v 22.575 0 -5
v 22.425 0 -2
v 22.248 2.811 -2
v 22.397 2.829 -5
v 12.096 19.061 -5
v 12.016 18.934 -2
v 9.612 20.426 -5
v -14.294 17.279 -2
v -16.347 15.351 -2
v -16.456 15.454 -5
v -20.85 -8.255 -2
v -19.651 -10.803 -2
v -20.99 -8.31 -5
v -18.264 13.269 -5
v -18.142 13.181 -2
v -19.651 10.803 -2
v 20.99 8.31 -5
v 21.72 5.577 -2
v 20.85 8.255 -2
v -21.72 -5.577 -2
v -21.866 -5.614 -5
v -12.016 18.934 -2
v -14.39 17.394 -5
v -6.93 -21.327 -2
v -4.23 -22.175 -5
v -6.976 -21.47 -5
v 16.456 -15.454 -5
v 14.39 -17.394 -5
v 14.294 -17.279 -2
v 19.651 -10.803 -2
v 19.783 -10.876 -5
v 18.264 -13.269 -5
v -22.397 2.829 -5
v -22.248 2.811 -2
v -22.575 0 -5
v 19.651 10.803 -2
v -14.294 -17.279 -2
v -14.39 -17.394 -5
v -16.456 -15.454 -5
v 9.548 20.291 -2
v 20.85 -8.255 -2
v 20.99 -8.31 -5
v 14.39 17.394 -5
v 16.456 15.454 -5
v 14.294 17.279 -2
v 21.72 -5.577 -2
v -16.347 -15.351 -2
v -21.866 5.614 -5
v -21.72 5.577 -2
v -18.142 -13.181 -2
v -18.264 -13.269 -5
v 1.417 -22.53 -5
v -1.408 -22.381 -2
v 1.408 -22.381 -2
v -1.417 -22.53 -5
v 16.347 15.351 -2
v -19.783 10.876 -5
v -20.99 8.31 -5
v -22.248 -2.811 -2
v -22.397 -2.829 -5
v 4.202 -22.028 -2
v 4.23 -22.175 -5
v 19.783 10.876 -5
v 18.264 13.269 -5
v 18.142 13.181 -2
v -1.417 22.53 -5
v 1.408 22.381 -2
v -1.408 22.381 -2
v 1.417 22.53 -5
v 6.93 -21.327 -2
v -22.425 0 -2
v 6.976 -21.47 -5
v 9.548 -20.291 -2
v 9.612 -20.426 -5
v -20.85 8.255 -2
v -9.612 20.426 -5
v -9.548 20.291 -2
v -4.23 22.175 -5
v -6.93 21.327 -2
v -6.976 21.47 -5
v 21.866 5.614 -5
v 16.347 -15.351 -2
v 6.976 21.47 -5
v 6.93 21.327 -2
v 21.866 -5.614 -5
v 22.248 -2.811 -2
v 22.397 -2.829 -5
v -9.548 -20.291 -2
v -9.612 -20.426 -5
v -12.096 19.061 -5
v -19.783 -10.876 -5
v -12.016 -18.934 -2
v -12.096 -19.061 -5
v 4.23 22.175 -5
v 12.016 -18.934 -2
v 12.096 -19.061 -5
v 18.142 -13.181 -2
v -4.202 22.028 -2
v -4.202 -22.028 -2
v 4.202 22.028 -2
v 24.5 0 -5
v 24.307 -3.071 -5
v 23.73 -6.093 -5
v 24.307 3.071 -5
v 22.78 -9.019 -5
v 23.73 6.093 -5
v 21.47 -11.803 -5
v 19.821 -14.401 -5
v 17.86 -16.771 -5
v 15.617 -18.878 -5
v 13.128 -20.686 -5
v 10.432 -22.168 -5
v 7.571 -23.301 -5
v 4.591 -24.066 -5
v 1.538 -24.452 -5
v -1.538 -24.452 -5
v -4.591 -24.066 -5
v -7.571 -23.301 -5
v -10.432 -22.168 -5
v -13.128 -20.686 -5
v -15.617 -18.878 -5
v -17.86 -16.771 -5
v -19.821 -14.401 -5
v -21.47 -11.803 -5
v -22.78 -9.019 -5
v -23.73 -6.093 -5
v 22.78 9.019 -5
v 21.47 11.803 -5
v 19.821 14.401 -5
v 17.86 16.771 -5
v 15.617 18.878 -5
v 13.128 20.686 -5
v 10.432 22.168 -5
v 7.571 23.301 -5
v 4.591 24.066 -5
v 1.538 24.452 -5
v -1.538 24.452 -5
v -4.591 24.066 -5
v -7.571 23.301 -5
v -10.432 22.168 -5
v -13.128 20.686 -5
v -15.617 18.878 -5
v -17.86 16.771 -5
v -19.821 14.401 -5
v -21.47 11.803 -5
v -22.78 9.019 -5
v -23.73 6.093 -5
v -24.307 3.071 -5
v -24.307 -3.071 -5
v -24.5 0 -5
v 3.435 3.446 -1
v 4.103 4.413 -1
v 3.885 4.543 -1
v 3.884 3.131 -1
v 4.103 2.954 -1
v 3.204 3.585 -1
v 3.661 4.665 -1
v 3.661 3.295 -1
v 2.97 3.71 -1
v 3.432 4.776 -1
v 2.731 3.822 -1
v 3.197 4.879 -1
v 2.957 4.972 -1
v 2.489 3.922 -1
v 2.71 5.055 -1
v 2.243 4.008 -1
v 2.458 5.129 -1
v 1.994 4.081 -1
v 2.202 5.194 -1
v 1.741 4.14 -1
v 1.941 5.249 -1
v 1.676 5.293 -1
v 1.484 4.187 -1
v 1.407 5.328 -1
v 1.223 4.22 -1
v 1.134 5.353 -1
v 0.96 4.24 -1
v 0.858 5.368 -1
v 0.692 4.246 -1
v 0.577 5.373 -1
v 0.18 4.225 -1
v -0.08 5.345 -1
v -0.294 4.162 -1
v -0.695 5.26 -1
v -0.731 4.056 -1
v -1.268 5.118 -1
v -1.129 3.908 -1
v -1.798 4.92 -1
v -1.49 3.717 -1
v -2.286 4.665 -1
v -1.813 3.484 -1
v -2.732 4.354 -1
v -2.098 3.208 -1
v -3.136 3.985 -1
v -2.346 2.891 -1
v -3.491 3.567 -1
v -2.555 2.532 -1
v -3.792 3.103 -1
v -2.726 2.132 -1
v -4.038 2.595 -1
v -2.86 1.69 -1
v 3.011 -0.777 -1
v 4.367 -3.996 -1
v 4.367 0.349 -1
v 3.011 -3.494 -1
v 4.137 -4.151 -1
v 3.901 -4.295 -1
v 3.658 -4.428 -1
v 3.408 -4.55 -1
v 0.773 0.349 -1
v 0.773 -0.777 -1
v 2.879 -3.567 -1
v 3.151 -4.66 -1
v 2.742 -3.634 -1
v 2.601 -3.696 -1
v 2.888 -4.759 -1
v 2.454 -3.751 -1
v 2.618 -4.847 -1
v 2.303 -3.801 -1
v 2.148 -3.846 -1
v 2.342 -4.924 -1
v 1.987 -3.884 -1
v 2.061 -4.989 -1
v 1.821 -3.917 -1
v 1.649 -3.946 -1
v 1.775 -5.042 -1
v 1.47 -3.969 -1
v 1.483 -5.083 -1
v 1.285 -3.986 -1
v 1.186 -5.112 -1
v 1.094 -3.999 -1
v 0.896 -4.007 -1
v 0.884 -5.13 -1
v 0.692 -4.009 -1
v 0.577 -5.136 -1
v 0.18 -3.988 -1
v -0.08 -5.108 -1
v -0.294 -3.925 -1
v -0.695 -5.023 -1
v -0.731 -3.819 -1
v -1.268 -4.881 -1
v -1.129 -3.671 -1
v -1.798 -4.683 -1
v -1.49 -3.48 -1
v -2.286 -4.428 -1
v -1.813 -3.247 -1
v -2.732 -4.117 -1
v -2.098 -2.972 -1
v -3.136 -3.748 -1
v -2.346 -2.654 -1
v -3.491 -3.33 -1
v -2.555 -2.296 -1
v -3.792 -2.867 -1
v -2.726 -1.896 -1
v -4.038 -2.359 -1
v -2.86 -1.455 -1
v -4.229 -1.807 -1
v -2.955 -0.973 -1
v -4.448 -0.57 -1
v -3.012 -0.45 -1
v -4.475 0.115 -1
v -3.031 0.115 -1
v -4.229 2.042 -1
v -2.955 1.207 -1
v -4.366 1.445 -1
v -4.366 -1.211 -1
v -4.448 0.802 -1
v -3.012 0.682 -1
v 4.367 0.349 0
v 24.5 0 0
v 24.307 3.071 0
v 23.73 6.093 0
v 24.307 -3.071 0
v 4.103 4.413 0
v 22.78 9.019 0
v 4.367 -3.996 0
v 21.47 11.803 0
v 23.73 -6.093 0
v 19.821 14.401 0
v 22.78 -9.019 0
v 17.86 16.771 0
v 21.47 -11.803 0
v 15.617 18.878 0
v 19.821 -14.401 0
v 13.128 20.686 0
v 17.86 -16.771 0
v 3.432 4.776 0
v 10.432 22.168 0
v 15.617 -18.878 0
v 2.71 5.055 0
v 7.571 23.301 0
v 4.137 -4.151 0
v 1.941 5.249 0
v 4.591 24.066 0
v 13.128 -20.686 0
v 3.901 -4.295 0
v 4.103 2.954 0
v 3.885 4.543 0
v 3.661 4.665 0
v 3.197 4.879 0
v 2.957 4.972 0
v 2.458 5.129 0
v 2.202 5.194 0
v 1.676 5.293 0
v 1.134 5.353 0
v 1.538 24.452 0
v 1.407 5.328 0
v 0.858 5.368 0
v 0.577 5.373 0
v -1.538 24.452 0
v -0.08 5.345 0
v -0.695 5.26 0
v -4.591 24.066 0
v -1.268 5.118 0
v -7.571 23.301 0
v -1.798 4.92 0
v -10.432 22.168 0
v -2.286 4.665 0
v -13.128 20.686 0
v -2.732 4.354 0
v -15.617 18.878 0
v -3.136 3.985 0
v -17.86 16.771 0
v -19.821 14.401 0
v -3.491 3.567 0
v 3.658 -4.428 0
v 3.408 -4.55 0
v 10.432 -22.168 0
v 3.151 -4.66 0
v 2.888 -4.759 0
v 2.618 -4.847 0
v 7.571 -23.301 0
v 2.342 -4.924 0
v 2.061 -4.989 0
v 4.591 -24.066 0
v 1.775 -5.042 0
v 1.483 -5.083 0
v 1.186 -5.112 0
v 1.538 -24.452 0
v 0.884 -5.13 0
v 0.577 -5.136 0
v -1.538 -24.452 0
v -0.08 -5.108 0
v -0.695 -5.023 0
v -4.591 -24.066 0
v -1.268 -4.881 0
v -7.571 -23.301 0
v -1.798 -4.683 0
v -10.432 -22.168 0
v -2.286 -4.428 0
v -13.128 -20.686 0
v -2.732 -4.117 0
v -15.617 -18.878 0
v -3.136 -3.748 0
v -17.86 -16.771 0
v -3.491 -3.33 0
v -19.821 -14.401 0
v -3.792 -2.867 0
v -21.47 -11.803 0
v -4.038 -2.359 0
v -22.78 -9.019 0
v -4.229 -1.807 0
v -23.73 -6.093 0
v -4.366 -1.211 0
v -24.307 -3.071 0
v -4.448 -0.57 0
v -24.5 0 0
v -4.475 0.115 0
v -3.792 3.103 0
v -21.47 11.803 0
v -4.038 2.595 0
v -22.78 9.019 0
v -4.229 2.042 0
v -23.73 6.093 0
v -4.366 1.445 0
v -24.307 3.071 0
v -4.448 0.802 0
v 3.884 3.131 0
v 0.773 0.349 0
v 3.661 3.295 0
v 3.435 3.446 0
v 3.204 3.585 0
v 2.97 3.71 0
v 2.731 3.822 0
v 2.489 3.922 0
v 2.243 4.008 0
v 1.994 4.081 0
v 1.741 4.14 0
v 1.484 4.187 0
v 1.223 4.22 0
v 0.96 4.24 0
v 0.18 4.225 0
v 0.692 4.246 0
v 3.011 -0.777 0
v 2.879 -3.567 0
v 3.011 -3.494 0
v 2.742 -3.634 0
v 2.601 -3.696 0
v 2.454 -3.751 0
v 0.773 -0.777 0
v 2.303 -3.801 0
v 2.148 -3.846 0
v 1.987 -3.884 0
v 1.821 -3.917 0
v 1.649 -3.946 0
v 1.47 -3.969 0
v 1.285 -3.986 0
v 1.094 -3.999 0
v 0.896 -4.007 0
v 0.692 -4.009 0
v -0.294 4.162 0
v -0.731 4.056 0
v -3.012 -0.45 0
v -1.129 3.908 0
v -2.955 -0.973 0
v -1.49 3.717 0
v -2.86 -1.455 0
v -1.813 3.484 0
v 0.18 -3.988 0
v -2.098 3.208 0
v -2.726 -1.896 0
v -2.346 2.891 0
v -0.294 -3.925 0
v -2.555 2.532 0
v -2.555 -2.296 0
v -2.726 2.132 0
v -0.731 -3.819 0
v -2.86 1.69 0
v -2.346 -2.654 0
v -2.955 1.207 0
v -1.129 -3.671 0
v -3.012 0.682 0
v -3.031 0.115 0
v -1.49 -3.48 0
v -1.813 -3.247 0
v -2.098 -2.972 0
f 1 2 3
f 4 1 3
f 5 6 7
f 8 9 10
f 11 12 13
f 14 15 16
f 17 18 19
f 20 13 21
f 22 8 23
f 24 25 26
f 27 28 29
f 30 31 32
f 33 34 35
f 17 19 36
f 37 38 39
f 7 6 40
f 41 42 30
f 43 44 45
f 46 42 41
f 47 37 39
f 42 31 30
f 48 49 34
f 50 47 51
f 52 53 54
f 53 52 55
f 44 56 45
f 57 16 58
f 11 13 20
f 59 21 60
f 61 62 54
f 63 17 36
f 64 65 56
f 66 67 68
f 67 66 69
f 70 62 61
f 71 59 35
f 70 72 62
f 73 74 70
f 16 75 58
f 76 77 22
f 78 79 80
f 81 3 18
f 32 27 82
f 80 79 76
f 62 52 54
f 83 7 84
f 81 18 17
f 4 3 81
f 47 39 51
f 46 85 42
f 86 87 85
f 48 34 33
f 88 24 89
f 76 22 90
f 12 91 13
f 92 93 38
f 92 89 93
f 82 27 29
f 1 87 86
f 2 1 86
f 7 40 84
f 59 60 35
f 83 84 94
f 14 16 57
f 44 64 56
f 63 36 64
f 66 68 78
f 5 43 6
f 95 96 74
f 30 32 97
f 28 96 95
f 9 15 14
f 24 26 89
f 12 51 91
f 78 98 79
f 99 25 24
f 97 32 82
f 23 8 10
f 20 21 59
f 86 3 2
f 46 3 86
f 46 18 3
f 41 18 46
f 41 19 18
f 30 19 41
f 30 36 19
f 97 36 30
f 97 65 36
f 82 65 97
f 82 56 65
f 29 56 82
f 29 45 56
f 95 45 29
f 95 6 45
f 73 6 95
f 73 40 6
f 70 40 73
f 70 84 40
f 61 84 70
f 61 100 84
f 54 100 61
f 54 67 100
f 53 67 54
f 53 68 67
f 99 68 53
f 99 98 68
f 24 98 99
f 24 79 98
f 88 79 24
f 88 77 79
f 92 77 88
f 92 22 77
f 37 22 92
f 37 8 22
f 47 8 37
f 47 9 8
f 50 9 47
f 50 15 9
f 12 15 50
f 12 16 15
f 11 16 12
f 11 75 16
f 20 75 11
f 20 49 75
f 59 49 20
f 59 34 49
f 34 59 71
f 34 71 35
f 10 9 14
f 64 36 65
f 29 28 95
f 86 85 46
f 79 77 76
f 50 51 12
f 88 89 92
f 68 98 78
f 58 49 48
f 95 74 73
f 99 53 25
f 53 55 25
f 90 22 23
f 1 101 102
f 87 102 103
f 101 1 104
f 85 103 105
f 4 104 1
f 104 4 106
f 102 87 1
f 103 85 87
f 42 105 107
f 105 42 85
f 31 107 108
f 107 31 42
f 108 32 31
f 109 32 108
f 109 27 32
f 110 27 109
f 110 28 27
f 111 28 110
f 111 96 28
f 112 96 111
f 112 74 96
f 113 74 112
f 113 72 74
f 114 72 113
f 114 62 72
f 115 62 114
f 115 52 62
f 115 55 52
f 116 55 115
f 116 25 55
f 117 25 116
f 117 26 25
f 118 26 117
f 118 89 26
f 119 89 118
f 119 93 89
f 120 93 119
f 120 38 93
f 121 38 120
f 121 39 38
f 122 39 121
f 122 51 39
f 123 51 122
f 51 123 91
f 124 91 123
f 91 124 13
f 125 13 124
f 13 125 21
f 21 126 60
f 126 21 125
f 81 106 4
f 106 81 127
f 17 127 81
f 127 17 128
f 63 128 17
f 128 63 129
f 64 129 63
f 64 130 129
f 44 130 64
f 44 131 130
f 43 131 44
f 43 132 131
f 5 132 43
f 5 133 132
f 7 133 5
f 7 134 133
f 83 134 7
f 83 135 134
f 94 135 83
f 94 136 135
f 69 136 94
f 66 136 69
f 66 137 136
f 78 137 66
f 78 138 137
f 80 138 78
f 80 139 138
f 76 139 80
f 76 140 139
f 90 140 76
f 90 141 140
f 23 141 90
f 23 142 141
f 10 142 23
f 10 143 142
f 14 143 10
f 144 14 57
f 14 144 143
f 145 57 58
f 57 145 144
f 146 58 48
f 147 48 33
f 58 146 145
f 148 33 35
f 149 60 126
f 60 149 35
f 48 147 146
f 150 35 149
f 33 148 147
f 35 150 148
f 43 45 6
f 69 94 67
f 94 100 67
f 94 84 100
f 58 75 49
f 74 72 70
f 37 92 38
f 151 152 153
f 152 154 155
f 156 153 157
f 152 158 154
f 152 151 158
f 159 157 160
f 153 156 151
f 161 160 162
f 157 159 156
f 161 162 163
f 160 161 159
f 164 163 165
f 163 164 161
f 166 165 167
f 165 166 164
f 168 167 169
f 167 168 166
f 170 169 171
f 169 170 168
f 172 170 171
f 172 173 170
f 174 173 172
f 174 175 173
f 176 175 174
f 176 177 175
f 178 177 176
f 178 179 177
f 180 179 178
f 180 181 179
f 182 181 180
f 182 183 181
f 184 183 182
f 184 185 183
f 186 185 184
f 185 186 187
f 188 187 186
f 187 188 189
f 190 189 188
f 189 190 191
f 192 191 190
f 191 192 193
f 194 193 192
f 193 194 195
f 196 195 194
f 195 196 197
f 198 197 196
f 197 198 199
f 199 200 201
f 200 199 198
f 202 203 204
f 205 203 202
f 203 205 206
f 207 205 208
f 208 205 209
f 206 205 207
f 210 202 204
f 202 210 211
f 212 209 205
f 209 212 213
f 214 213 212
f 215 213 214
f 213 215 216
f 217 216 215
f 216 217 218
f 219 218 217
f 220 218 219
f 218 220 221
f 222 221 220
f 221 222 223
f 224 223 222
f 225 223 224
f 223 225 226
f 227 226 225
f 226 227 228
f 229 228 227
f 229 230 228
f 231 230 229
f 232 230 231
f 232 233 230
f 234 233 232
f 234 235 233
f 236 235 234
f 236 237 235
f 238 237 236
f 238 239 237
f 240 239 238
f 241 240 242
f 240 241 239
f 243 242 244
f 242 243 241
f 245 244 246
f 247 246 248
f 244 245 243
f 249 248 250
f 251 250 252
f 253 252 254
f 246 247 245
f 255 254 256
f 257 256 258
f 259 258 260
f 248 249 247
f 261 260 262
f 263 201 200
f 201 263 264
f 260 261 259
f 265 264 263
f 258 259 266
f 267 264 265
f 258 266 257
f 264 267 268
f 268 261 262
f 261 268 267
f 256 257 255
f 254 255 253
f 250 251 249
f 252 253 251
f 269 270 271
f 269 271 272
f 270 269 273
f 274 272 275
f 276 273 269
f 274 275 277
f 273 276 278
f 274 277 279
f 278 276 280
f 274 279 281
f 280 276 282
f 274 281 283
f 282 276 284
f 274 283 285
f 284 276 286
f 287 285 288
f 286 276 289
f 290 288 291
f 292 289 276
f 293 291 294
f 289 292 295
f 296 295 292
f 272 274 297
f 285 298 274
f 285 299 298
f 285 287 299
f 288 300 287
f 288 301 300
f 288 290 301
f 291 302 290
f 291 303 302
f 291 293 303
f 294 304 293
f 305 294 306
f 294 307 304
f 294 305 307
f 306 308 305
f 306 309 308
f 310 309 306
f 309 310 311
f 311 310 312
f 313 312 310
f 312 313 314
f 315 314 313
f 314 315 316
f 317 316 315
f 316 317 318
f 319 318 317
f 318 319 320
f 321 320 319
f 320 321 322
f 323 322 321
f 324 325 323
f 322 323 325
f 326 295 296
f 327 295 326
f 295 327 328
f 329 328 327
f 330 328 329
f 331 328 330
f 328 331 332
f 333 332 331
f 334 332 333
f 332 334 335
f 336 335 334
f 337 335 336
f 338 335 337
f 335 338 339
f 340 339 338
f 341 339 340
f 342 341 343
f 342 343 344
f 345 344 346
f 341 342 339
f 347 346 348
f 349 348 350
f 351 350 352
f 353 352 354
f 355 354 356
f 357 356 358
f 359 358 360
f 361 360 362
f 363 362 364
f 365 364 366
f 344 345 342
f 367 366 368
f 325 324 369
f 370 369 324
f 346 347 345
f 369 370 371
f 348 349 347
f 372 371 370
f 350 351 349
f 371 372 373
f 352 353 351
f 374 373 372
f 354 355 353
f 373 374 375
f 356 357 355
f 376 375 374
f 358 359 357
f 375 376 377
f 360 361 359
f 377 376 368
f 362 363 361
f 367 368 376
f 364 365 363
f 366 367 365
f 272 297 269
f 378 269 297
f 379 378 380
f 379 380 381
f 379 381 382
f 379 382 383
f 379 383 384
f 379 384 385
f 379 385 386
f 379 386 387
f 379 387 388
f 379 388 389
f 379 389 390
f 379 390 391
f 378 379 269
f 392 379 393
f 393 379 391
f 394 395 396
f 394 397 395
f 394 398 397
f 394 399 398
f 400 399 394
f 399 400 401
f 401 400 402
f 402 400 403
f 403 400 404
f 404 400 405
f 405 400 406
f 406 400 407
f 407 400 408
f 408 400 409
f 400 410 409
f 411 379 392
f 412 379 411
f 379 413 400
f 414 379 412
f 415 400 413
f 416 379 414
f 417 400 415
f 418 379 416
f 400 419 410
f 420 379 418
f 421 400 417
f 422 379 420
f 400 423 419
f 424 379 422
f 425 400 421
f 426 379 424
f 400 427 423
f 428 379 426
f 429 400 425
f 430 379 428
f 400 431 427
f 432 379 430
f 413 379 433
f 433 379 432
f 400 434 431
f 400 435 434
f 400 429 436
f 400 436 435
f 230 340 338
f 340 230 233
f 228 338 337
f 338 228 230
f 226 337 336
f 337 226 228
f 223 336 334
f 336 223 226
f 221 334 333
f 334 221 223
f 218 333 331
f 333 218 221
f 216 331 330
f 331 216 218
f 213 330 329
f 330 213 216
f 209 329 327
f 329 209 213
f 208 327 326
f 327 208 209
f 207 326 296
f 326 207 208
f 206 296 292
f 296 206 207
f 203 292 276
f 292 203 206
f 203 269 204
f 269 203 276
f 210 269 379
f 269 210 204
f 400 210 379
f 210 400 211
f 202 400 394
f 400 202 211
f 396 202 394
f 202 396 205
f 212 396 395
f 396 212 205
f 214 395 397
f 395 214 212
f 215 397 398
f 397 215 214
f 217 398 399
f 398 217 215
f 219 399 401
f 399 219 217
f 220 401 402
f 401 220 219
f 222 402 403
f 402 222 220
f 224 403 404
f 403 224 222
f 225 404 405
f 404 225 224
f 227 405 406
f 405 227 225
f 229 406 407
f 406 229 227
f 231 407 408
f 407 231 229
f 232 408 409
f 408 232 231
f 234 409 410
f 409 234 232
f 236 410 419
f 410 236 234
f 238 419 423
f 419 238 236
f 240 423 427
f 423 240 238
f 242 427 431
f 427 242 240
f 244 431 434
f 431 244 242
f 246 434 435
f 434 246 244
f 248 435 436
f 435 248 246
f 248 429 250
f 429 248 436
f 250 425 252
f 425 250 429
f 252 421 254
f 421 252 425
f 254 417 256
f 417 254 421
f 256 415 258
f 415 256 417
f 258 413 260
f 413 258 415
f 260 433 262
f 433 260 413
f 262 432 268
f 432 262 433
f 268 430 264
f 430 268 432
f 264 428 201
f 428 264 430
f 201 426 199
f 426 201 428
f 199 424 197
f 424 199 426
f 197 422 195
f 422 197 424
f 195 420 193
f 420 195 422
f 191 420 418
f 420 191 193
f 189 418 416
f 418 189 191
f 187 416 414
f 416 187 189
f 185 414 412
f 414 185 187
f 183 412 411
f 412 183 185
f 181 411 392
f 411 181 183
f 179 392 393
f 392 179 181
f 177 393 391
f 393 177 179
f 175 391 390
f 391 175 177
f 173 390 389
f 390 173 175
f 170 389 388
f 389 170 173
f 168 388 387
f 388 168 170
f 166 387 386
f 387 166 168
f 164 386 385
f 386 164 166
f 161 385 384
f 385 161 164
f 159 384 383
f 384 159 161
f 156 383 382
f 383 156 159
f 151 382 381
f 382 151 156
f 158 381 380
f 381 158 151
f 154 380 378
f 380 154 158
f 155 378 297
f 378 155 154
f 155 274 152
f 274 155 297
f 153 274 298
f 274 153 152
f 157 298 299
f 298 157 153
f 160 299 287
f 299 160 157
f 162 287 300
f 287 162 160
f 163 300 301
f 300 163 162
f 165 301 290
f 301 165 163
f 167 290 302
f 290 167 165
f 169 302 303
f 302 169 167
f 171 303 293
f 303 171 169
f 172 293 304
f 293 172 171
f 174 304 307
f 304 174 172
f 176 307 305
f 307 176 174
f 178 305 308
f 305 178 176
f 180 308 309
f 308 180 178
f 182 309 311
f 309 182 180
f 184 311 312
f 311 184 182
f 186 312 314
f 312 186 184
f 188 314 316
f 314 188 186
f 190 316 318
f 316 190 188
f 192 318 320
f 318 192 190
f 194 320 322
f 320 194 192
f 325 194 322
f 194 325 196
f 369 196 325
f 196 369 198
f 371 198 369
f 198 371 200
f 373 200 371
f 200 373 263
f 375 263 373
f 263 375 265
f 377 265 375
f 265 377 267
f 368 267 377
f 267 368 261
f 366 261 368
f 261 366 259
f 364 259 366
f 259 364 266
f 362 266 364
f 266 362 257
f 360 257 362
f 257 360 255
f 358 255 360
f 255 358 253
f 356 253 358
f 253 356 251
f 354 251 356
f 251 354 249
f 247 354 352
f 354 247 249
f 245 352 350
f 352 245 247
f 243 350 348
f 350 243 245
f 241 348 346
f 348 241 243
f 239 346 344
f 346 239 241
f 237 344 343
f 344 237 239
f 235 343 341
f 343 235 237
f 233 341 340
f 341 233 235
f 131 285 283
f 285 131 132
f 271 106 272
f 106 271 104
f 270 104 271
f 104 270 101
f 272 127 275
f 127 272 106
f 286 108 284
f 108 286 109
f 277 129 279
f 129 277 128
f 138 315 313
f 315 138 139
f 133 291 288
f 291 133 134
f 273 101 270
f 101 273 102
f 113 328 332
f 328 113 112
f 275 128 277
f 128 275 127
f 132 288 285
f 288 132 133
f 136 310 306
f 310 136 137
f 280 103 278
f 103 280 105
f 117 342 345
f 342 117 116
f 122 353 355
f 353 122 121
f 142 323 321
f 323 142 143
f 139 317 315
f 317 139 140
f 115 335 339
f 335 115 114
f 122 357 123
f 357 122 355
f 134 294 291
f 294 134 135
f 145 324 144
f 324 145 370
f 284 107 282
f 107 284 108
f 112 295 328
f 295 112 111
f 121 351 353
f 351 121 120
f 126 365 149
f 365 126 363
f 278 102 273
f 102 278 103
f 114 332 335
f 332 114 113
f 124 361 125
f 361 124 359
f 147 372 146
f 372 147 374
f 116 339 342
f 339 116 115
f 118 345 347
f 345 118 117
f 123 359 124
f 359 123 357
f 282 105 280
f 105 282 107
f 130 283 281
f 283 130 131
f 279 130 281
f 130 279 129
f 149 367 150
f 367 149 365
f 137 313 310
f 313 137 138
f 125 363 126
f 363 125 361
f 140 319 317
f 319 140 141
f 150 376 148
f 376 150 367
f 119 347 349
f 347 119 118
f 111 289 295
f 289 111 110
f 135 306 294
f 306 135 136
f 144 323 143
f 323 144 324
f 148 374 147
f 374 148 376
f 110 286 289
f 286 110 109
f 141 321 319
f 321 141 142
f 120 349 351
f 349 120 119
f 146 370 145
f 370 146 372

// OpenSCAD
$fn = 50;


difference() {
	union() {
		translate(v = [0, 0, -5.0000000000]) {
			cylinder(h = 5, r = 24.5000000000);
		}
	}
	union() {
		#translate(v = [0, 0, -5.0000000000]) {
			cylinder(h = 3, r1 = 22.5750000000, r2 = 22.4250000000);
		}
		translate(v = [0, 0, -1]) {
			linear_extrude(height = 1) {
				text(font = "Impact", halign = "center", size = 10, text = "G", valign = "center");
			}
		}
	}
}
